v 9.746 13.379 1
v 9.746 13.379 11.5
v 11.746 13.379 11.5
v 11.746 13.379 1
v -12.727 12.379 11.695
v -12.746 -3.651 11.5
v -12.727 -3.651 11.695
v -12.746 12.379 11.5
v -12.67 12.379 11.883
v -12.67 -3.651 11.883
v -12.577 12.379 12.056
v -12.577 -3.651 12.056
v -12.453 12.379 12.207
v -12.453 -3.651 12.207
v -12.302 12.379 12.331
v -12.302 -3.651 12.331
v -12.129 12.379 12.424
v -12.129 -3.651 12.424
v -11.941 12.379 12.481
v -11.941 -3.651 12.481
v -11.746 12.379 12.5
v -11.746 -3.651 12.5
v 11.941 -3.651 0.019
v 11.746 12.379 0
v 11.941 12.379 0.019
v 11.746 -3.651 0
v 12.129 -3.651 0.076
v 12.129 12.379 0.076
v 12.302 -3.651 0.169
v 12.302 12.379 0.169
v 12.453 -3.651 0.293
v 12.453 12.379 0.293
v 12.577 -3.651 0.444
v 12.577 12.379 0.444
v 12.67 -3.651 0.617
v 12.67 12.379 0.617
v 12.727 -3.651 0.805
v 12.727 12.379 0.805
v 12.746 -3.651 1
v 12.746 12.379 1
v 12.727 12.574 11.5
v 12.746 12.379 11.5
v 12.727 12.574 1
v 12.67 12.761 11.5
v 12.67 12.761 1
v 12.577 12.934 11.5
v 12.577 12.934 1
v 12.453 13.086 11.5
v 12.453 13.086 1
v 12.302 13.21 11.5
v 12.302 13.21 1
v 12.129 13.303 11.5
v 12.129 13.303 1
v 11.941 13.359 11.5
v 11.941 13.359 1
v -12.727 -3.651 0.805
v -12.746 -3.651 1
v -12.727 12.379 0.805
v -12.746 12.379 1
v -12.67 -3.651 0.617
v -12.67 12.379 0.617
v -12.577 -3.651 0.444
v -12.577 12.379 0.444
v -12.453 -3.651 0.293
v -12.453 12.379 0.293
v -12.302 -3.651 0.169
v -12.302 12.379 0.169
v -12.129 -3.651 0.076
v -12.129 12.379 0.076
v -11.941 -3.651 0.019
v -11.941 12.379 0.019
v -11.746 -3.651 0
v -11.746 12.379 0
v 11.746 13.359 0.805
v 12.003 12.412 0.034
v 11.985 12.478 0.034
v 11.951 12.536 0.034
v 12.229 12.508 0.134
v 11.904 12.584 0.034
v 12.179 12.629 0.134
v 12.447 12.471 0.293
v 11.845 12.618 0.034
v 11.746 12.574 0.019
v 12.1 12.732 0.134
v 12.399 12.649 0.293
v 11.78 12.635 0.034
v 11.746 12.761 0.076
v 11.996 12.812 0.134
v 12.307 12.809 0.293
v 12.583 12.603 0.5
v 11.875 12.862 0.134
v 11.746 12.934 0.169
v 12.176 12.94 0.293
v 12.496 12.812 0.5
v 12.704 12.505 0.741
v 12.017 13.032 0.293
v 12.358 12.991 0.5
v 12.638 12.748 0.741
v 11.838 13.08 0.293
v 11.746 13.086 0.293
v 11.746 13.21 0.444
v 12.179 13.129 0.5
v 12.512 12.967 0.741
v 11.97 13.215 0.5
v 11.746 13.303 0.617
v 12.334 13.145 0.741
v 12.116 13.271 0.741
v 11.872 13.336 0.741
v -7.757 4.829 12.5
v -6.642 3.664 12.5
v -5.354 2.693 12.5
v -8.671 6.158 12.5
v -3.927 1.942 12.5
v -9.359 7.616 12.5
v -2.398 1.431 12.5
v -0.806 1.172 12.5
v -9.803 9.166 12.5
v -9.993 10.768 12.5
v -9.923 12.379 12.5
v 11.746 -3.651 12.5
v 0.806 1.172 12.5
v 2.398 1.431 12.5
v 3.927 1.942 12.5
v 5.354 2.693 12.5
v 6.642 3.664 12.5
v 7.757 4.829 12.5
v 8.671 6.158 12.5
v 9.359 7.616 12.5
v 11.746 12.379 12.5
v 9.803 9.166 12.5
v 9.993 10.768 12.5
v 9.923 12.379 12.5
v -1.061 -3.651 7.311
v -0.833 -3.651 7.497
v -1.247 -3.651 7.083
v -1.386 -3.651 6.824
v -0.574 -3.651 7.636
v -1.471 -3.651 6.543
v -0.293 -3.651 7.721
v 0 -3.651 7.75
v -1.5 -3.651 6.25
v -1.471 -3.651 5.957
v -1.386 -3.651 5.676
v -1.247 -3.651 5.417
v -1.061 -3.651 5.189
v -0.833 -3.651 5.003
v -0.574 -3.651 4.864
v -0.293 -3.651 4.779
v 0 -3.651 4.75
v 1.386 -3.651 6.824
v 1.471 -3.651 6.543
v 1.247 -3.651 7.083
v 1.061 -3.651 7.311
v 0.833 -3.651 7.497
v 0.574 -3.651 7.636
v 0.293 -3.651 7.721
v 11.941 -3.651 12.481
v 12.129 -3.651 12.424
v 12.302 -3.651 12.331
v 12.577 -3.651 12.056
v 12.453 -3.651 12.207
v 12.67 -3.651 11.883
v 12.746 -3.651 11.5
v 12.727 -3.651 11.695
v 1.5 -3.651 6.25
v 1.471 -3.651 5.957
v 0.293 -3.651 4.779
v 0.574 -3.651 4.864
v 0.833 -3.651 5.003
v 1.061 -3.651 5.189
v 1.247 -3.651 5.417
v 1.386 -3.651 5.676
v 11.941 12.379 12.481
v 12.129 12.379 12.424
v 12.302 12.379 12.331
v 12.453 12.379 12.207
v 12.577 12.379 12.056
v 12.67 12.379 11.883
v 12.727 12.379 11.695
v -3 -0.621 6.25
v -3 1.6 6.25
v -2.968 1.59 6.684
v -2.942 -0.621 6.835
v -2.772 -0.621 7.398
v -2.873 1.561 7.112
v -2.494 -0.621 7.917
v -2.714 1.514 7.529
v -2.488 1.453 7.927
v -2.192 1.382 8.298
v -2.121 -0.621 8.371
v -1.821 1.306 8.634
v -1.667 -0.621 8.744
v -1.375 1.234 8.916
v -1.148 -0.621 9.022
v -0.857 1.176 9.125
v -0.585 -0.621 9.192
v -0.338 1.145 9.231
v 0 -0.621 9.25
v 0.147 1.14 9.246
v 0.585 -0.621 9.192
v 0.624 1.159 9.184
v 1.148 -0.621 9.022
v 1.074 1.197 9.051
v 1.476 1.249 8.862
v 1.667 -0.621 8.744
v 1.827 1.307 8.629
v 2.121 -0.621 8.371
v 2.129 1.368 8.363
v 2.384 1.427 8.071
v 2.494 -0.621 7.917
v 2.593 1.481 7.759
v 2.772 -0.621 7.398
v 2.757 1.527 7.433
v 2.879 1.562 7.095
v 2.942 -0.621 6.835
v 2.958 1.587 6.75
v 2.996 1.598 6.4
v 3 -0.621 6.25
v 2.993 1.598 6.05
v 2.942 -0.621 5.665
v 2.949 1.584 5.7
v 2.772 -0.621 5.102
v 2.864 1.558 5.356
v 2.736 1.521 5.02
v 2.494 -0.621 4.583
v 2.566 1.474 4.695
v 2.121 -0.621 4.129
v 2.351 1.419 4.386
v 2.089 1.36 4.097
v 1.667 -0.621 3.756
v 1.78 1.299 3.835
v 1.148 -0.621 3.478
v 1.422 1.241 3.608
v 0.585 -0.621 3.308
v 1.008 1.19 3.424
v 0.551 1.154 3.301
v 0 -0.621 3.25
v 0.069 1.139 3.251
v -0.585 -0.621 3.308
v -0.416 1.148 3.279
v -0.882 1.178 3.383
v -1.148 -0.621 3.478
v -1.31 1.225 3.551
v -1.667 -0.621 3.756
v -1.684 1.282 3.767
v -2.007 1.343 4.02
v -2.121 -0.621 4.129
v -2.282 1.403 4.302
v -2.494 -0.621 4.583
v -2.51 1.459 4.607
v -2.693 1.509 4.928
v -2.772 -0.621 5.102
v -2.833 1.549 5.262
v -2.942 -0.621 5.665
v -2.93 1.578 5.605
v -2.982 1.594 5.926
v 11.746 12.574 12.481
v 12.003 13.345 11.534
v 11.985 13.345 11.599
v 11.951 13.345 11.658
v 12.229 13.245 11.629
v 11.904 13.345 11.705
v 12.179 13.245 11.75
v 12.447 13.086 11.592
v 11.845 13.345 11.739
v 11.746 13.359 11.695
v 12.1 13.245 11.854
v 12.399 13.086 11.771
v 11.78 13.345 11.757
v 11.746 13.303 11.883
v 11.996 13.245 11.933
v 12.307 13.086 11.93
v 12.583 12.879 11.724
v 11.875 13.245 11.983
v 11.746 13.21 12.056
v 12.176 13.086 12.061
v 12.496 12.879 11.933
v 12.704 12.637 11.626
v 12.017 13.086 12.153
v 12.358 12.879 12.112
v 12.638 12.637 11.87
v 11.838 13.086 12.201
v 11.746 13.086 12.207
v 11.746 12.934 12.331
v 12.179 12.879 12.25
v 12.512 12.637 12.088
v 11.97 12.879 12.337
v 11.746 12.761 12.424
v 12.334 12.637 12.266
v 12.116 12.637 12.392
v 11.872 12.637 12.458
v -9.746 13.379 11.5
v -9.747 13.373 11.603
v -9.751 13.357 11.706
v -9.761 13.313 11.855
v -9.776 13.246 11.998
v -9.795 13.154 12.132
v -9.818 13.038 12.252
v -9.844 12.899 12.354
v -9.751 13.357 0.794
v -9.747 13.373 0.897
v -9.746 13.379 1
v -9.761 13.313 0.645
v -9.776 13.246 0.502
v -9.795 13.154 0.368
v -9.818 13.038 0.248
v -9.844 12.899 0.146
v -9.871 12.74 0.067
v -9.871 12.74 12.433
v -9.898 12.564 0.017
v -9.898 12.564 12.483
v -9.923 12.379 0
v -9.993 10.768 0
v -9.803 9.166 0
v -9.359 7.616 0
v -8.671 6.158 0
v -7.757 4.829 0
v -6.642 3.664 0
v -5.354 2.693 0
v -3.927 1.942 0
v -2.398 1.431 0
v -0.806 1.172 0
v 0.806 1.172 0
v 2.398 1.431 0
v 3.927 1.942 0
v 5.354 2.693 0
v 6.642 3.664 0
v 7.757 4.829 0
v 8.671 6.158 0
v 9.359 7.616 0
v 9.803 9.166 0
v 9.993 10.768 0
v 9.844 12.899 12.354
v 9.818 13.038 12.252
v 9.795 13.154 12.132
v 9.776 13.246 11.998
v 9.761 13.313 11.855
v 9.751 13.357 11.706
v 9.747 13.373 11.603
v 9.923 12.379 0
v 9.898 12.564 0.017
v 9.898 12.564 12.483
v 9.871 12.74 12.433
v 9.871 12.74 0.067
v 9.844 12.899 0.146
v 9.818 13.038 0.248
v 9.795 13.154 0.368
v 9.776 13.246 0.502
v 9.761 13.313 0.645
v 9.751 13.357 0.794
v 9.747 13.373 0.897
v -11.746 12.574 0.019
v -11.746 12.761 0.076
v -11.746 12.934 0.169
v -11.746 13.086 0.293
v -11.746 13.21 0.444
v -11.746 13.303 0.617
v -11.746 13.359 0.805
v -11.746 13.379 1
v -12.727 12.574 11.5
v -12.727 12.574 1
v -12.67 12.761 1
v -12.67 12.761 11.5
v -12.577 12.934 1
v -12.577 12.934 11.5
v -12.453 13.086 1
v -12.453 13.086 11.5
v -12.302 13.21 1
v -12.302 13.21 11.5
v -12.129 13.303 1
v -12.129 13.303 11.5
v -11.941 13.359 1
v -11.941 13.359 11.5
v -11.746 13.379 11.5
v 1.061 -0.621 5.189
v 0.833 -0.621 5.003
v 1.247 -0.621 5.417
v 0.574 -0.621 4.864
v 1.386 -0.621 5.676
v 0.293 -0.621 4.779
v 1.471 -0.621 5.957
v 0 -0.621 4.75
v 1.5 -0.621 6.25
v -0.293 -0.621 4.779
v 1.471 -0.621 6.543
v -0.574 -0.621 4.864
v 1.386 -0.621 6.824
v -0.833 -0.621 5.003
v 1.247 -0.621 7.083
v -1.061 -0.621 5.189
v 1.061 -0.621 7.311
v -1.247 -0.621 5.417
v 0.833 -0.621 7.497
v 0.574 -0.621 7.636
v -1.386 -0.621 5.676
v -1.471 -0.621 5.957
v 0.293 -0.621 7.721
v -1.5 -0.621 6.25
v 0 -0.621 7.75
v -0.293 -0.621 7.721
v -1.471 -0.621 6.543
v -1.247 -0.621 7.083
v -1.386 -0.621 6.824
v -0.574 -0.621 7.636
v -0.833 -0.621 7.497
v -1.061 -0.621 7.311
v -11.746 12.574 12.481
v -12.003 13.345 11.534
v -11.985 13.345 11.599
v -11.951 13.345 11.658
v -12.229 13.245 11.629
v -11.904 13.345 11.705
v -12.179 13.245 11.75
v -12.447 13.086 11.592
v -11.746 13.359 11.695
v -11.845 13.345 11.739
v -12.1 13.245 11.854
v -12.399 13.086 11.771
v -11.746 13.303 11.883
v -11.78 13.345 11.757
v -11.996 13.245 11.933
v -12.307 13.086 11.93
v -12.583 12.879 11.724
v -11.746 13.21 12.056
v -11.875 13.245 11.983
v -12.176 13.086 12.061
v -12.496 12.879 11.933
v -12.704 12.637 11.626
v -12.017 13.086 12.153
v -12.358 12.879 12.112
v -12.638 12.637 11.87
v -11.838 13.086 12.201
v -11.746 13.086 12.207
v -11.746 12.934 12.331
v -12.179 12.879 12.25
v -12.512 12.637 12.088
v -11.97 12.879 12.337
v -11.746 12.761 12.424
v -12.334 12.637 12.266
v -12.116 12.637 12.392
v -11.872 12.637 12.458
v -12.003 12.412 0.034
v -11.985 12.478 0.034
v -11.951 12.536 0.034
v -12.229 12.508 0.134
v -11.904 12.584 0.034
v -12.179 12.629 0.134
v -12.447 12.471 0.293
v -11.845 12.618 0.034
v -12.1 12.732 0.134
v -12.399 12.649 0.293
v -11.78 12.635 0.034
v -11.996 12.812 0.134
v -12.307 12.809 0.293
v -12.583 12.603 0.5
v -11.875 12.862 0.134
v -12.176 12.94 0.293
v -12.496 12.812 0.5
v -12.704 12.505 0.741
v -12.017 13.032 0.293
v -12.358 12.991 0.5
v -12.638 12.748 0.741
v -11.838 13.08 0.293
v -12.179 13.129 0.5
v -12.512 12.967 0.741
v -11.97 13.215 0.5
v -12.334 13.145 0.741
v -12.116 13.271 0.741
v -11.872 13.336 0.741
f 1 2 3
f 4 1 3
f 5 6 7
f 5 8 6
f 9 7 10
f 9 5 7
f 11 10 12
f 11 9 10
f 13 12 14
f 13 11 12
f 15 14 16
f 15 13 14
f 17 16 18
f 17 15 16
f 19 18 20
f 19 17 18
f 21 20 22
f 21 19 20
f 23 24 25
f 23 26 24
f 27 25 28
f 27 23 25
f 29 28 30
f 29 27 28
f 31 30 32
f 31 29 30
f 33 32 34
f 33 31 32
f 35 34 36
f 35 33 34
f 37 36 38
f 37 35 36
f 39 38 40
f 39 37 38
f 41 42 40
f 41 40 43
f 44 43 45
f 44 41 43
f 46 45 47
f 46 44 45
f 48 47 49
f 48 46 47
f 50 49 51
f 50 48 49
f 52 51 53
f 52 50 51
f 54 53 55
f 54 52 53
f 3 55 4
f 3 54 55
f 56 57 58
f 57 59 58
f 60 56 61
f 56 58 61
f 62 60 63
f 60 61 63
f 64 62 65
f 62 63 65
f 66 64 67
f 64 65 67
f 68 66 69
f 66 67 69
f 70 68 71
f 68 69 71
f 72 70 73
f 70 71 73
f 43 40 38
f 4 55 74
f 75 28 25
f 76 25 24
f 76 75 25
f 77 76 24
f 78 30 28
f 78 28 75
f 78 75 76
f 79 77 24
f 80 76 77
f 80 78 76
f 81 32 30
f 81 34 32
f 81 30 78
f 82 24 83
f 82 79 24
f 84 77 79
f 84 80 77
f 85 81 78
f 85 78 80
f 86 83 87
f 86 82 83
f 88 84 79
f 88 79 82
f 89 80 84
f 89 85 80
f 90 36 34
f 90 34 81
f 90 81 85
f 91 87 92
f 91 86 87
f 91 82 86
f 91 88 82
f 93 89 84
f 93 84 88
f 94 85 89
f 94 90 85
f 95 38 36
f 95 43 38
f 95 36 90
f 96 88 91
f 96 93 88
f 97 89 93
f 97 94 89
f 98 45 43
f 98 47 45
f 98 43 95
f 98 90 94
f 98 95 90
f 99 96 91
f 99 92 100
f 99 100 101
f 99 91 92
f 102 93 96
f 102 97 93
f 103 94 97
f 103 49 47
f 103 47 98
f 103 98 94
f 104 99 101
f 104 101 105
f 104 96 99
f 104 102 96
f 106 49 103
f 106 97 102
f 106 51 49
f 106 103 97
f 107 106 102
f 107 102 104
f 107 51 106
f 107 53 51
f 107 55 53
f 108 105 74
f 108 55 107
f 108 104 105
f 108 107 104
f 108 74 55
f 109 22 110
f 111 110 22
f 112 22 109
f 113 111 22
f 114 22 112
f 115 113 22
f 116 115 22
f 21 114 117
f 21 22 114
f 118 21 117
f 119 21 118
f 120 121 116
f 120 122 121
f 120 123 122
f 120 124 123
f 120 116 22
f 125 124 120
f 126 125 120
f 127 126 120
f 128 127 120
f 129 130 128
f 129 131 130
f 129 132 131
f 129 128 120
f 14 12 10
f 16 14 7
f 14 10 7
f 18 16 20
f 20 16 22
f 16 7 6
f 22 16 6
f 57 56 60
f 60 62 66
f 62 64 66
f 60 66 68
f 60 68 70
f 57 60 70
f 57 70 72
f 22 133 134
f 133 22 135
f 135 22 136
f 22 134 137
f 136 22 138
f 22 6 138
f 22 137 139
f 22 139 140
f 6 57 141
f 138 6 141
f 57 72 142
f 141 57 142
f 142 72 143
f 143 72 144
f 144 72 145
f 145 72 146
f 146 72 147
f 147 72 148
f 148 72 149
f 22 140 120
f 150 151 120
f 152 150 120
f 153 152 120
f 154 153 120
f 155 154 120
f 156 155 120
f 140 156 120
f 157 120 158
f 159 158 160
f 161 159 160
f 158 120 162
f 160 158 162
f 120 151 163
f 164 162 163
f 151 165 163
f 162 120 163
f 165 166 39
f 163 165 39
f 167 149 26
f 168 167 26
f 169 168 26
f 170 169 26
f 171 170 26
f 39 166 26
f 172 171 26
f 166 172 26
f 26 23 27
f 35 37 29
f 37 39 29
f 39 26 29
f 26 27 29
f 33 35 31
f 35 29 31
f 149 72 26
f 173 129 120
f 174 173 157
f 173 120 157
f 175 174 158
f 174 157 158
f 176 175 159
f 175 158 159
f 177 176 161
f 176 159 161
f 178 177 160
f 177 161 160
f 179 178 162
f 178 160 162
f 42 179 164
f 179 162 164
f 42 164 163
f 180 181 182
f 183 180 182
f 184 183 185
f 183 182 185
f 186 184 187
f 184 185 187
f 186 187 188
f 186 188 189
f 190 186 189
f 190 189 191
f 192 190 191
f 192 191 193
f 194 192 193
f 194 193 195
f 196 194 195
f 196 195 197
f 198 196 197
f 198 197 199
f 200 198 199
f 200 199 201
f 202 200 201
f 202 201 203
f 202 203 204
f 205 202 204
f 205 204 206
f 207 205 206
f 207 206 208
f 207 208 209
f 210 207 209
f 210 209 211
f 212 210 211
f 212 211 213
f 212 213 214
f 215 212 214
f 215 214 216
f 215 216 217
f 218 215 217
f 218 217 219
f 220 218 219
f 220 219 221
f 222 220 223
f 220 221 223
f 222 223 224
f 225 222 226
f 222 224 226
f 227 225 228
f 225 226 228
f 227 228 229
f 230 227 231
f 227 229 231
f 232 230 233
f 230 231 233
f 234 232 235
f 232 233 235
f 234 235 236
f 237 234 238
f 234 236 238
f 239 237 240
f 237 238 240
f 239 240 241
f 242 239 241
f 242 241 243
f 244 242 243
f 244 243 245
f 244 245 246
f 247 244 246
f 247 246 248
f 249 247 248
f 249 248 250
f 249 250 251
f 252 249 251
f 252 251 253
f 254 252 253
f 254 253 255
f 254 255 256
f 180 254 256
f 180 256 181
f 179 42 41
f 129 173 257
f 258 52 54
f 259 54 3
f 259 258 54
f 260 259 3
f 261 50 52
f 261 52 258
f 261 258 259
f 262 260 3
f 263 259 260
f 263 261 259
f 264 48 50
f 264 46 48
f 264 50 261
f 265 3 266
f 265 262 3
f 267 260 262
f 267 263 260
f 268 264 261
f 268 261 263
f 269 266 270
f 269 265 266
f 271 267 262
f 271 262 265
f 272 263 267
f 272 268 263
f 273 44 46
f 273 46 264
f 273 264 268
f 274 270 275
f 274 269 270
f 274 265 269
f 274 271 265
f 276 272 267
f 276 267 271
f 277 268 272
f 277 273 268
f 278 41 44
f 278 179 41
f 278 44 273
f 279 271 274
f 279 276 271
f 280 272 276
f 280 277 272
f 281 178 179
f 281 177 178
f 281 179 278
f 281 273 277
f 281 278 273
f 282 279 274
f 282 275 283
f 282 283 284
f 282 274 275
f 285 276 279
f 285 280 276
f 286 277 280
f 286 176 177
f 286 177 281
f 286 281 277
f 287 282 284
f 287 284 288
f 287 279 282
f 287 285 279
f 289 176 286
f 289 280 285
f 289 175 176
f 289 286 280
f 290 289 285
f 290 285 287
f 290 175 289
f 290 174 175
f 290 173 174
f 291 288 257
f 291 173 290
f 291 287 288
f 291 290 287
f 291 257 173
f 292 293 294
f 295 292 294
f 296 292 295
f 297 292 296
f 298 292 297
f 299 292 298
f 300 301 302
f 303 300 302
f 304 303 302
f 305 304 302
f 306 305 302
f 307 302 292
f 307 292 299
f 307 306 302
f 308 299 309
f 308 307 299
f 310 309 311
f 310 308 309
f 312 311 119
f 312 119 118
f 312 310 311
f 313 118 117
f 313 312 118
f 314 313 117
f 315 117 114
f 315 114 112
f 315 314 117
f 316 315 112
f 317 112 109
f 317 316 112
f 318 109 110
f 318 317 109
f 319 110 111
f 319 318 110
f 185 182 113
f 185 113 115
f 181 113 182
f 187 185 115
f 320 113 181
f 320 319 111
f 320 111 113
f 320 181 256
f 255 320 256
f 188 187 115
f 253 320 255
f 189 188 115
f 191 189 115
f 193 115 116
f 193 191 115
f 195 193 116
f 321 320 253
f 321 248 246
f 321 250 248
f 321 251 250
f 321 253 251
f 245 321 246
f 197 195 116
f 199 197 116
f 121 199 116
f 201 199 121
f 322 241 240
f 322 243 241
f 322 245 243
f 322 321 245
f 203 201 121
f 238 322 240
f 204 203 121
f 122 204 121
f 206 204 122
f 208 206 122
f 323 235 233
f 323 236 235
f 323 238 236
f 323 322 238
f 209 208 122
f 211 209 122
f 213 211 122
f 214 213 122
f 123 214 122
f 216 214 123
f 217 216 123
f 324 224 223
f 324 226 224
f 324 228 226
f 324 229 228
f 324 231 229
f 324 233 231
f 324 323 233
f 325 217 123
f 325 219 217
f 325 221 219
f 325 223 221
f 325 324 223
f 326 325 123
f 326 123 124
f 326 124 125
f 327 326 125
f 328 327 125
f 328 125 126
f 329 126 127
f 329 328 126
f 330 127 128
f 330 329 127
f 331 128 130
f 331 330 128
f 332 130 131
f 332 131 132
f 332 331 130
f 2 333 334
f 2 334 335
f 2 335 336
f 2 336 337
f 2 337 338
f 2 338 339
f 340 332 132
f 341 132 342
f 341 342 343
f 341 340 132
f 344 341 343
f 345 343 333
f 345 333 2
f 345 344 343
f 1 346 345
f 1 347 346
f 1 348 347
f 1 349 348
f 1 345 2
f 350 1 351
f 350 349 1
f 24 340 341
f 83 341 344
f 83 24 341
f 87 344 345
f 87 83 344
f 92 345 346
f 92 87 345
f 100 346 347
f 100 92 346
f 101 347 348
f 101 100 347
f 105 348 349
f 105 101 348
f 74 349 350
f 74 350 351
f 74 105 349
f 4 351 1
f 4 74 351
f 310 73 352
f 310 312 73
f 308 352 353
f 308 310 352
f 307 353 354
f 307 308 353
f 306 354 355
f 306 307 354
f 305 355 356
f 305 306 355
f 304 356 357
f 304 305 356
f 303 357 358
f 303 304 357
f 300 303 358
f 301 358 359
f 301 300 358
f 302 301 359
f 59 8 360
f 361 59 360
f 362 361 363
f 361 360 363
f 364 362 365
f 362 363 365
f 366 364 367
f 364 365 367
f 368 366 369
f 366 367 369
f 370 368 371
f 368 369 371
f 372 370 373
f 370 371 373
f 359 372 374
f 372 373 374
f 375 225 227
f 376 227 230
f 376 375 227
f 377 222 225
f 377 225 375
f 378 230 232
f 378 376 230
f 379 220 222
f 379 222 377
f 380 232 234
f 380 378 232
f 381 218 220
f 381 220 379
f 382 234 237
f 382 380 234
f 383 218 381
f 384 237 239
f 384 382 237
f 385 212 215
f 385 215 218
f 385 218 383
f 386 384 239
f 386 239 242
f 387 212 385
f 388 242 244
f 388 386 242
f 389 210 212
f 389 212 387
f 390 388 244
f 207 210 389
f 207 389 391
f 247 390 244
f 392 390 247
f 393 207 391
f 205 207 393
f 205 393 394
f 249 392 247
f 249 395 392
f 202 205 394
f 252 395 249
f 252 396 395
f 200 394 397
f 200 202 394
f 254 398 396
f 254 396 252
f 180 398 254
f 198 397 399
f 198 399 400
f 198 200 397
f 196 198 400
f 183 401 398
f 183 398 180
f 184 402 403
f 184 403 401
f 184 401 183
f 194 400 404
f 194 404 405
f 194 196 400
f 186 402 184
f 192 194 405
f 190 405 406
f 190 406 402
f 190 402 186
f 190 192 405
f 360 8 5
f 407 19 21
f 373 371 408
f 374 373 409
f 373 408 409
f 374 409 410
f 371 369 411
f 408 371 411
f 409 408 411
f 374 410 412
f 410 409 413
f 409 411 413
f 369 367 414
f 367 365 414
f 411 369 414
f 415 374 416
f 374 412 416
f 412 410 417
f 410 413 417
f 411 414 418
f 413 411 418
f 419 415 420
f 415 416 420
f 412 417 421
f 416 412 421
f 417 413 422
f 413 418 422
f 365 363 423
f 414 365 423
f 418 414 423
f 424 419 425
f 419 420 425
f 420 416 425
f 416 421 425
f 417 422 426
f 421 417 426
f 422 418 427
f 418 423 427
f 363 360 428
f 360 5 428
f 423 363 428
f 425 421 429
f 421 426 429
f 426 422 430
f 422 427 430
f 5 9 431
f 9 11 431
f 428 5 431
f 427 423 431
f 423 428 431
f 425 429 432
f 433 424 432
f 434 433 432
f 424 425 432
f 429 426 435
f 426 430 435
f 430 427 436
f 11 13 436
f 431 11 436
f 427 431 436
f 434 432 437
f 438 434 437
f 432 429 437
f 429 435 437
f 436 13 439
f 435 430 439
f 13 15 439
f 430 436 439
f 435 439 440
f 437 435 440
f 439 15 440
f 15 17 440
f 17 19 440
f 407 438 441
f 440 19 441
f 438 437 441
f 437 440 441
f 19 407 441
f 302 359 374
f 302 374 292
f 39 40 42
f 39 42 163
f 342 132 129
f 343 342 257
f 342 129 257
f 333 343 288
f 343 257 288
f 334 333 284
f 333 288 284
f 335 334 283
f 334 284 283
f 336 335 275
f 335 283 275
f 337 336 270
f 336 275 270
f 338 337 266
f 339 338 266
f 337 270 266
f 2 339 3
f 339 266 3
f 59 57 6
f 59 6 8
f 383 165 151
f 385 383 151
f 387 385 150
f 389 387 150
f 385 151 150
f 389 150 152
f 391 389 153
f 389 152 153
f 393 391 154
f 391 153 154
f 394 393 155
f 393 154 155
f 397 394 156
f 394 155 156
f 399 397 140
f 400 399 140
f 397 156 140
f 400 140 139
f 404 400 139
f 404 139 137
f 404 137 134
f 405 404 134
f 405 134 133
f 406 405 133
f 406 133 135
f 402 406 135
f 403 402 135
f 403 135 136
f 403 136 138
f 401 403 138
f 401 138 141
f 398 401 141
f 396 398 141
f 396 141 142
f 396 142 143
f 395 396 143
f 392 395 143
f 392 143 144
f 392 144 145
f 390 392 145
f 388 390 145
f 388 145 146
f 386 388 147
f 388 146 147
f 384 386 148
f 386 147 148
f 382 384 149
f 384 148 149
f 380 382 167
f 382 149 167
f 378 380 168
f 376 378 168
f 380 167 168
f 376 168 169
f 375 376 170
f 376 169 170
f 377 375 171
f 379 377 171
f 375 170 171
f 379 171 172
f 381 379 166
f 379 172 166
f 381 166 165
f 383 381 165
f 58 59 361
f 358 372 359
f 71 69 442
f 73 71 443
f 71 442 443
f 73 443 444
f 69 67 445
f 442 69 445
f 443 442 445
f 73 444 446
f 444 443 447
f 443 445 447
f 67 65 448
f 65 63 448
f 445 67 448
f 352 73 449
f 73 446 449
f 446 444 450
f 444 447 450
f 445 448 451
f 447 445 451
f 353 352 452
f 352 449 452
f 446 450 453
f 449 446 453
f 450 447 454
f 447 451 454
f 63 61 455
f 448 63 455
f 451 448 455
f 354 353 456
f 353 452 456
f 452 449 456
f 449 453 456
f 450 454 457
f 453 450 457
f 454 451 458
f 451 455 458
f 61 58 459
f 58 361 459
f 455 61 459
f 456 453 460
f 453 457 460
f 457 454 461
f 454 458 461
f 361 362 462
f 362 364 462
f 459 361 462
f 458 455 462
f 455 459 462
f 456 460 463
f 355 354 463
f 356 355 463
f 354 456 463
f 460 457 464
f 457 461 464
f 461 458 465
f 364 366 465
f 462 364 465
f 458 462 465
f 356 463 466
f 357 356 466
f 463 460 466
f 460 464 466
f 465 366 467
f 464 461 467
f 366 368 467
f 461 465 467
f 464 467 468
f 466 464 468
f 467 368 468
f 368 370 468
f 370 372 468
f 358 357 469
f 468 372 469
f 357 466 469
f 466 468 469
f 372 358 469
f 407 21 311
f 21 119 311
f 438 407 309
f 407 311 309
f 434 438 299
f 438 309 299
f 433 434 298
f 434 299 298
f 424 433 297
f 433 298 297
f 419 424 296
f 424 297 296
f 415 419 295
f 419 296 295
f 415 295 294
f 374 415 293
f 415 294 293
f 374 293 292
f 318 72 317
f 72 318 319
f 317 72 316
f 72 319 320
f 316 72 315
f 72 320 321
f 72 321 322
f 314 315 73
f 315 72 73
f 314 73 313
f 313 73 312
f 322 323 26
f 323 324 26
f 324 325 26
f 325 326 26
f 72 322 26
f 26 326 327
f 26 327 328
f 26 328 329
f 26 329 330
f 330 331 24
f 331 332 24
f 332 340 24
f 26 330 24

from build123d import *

# Parameters (mm, degrees)
PAD_DEPTH       = 12.5
SKETCH001_R     = 1.5
POCKET_DEPTH    = 17.030262
SKETCH002_R     = 3
POCKET001_DEPTH = 14
FILLET_R        = 1


with BuildPart() as part:
    # Sketch → Pad (new body)
    with BuildSketch(Plane.XY):
        with BuildLine():
            Line((-12.745991, -3.650621), (12.745991, -3.650621))
            Line((12.745991, 13.378641), (12.745991, -3.650621))
            Line((9.745991, 13.378641), (12.745991, 13.378641))
            ThreePointArc((-9.745991, 13.378641), (0, 1.139072), (9.745991, 13.378641))
            Line((-12.745991, 13.378641), (-9.745991, 13.378641))
            Line((-12.745991, -3.650621), (-12.745991, 13.378641))
        make_face()
    extrude(amount=PAD_DEPTH)

    # Sketch001 (on Face1 of Pad) → Pocket (cut, through all)
    with BuildSketch(Plane.XZ.offset(3.650621)):
        with Locations((0, 6.25)):
            Circle(SKETCH001_R)
    extrude(amount=-POCKET_DEPTH, mode=Mode.SUBTRACT)

    # Sketch002 (on Face8 of Pocket) → Pocket001 (cut)
    with BuildSketch(Plane(origin=(0, 13.378641, 0), x_dir=(-1, 0, 0), z_dir=(0, 1, 0))):
        with Locations((0, 6.25)):
            Circle(SKETCH002_R)
    extrude(amount=-POCKET001_DEPTH, mode=Mode.SUBTRACT)

    # Fillet
    fillet_edges = [part.edges().sort_by_distance(p)[0] for p in [
        (12.745991, 4.86401, 12.5),
        (12.745991, 13.378641, 6.25),
        (12.745991, 4.86401, 0),
        (-12.745991, 4.86401, 12.5),
        (-12.745991, 13.378641, 6.25),
        (-12.745991, 4.86401, 0),
        (-11.245991, 13.378641, 12.5),
        (-11.245991, 13.378641, 0),
        (11.245991, 13.378641, 0),
        (11.245991, 13.378641, 12.5),
    ]]
    fillet(fillet_edges, radius=FILLET_R)


solid = part.part
